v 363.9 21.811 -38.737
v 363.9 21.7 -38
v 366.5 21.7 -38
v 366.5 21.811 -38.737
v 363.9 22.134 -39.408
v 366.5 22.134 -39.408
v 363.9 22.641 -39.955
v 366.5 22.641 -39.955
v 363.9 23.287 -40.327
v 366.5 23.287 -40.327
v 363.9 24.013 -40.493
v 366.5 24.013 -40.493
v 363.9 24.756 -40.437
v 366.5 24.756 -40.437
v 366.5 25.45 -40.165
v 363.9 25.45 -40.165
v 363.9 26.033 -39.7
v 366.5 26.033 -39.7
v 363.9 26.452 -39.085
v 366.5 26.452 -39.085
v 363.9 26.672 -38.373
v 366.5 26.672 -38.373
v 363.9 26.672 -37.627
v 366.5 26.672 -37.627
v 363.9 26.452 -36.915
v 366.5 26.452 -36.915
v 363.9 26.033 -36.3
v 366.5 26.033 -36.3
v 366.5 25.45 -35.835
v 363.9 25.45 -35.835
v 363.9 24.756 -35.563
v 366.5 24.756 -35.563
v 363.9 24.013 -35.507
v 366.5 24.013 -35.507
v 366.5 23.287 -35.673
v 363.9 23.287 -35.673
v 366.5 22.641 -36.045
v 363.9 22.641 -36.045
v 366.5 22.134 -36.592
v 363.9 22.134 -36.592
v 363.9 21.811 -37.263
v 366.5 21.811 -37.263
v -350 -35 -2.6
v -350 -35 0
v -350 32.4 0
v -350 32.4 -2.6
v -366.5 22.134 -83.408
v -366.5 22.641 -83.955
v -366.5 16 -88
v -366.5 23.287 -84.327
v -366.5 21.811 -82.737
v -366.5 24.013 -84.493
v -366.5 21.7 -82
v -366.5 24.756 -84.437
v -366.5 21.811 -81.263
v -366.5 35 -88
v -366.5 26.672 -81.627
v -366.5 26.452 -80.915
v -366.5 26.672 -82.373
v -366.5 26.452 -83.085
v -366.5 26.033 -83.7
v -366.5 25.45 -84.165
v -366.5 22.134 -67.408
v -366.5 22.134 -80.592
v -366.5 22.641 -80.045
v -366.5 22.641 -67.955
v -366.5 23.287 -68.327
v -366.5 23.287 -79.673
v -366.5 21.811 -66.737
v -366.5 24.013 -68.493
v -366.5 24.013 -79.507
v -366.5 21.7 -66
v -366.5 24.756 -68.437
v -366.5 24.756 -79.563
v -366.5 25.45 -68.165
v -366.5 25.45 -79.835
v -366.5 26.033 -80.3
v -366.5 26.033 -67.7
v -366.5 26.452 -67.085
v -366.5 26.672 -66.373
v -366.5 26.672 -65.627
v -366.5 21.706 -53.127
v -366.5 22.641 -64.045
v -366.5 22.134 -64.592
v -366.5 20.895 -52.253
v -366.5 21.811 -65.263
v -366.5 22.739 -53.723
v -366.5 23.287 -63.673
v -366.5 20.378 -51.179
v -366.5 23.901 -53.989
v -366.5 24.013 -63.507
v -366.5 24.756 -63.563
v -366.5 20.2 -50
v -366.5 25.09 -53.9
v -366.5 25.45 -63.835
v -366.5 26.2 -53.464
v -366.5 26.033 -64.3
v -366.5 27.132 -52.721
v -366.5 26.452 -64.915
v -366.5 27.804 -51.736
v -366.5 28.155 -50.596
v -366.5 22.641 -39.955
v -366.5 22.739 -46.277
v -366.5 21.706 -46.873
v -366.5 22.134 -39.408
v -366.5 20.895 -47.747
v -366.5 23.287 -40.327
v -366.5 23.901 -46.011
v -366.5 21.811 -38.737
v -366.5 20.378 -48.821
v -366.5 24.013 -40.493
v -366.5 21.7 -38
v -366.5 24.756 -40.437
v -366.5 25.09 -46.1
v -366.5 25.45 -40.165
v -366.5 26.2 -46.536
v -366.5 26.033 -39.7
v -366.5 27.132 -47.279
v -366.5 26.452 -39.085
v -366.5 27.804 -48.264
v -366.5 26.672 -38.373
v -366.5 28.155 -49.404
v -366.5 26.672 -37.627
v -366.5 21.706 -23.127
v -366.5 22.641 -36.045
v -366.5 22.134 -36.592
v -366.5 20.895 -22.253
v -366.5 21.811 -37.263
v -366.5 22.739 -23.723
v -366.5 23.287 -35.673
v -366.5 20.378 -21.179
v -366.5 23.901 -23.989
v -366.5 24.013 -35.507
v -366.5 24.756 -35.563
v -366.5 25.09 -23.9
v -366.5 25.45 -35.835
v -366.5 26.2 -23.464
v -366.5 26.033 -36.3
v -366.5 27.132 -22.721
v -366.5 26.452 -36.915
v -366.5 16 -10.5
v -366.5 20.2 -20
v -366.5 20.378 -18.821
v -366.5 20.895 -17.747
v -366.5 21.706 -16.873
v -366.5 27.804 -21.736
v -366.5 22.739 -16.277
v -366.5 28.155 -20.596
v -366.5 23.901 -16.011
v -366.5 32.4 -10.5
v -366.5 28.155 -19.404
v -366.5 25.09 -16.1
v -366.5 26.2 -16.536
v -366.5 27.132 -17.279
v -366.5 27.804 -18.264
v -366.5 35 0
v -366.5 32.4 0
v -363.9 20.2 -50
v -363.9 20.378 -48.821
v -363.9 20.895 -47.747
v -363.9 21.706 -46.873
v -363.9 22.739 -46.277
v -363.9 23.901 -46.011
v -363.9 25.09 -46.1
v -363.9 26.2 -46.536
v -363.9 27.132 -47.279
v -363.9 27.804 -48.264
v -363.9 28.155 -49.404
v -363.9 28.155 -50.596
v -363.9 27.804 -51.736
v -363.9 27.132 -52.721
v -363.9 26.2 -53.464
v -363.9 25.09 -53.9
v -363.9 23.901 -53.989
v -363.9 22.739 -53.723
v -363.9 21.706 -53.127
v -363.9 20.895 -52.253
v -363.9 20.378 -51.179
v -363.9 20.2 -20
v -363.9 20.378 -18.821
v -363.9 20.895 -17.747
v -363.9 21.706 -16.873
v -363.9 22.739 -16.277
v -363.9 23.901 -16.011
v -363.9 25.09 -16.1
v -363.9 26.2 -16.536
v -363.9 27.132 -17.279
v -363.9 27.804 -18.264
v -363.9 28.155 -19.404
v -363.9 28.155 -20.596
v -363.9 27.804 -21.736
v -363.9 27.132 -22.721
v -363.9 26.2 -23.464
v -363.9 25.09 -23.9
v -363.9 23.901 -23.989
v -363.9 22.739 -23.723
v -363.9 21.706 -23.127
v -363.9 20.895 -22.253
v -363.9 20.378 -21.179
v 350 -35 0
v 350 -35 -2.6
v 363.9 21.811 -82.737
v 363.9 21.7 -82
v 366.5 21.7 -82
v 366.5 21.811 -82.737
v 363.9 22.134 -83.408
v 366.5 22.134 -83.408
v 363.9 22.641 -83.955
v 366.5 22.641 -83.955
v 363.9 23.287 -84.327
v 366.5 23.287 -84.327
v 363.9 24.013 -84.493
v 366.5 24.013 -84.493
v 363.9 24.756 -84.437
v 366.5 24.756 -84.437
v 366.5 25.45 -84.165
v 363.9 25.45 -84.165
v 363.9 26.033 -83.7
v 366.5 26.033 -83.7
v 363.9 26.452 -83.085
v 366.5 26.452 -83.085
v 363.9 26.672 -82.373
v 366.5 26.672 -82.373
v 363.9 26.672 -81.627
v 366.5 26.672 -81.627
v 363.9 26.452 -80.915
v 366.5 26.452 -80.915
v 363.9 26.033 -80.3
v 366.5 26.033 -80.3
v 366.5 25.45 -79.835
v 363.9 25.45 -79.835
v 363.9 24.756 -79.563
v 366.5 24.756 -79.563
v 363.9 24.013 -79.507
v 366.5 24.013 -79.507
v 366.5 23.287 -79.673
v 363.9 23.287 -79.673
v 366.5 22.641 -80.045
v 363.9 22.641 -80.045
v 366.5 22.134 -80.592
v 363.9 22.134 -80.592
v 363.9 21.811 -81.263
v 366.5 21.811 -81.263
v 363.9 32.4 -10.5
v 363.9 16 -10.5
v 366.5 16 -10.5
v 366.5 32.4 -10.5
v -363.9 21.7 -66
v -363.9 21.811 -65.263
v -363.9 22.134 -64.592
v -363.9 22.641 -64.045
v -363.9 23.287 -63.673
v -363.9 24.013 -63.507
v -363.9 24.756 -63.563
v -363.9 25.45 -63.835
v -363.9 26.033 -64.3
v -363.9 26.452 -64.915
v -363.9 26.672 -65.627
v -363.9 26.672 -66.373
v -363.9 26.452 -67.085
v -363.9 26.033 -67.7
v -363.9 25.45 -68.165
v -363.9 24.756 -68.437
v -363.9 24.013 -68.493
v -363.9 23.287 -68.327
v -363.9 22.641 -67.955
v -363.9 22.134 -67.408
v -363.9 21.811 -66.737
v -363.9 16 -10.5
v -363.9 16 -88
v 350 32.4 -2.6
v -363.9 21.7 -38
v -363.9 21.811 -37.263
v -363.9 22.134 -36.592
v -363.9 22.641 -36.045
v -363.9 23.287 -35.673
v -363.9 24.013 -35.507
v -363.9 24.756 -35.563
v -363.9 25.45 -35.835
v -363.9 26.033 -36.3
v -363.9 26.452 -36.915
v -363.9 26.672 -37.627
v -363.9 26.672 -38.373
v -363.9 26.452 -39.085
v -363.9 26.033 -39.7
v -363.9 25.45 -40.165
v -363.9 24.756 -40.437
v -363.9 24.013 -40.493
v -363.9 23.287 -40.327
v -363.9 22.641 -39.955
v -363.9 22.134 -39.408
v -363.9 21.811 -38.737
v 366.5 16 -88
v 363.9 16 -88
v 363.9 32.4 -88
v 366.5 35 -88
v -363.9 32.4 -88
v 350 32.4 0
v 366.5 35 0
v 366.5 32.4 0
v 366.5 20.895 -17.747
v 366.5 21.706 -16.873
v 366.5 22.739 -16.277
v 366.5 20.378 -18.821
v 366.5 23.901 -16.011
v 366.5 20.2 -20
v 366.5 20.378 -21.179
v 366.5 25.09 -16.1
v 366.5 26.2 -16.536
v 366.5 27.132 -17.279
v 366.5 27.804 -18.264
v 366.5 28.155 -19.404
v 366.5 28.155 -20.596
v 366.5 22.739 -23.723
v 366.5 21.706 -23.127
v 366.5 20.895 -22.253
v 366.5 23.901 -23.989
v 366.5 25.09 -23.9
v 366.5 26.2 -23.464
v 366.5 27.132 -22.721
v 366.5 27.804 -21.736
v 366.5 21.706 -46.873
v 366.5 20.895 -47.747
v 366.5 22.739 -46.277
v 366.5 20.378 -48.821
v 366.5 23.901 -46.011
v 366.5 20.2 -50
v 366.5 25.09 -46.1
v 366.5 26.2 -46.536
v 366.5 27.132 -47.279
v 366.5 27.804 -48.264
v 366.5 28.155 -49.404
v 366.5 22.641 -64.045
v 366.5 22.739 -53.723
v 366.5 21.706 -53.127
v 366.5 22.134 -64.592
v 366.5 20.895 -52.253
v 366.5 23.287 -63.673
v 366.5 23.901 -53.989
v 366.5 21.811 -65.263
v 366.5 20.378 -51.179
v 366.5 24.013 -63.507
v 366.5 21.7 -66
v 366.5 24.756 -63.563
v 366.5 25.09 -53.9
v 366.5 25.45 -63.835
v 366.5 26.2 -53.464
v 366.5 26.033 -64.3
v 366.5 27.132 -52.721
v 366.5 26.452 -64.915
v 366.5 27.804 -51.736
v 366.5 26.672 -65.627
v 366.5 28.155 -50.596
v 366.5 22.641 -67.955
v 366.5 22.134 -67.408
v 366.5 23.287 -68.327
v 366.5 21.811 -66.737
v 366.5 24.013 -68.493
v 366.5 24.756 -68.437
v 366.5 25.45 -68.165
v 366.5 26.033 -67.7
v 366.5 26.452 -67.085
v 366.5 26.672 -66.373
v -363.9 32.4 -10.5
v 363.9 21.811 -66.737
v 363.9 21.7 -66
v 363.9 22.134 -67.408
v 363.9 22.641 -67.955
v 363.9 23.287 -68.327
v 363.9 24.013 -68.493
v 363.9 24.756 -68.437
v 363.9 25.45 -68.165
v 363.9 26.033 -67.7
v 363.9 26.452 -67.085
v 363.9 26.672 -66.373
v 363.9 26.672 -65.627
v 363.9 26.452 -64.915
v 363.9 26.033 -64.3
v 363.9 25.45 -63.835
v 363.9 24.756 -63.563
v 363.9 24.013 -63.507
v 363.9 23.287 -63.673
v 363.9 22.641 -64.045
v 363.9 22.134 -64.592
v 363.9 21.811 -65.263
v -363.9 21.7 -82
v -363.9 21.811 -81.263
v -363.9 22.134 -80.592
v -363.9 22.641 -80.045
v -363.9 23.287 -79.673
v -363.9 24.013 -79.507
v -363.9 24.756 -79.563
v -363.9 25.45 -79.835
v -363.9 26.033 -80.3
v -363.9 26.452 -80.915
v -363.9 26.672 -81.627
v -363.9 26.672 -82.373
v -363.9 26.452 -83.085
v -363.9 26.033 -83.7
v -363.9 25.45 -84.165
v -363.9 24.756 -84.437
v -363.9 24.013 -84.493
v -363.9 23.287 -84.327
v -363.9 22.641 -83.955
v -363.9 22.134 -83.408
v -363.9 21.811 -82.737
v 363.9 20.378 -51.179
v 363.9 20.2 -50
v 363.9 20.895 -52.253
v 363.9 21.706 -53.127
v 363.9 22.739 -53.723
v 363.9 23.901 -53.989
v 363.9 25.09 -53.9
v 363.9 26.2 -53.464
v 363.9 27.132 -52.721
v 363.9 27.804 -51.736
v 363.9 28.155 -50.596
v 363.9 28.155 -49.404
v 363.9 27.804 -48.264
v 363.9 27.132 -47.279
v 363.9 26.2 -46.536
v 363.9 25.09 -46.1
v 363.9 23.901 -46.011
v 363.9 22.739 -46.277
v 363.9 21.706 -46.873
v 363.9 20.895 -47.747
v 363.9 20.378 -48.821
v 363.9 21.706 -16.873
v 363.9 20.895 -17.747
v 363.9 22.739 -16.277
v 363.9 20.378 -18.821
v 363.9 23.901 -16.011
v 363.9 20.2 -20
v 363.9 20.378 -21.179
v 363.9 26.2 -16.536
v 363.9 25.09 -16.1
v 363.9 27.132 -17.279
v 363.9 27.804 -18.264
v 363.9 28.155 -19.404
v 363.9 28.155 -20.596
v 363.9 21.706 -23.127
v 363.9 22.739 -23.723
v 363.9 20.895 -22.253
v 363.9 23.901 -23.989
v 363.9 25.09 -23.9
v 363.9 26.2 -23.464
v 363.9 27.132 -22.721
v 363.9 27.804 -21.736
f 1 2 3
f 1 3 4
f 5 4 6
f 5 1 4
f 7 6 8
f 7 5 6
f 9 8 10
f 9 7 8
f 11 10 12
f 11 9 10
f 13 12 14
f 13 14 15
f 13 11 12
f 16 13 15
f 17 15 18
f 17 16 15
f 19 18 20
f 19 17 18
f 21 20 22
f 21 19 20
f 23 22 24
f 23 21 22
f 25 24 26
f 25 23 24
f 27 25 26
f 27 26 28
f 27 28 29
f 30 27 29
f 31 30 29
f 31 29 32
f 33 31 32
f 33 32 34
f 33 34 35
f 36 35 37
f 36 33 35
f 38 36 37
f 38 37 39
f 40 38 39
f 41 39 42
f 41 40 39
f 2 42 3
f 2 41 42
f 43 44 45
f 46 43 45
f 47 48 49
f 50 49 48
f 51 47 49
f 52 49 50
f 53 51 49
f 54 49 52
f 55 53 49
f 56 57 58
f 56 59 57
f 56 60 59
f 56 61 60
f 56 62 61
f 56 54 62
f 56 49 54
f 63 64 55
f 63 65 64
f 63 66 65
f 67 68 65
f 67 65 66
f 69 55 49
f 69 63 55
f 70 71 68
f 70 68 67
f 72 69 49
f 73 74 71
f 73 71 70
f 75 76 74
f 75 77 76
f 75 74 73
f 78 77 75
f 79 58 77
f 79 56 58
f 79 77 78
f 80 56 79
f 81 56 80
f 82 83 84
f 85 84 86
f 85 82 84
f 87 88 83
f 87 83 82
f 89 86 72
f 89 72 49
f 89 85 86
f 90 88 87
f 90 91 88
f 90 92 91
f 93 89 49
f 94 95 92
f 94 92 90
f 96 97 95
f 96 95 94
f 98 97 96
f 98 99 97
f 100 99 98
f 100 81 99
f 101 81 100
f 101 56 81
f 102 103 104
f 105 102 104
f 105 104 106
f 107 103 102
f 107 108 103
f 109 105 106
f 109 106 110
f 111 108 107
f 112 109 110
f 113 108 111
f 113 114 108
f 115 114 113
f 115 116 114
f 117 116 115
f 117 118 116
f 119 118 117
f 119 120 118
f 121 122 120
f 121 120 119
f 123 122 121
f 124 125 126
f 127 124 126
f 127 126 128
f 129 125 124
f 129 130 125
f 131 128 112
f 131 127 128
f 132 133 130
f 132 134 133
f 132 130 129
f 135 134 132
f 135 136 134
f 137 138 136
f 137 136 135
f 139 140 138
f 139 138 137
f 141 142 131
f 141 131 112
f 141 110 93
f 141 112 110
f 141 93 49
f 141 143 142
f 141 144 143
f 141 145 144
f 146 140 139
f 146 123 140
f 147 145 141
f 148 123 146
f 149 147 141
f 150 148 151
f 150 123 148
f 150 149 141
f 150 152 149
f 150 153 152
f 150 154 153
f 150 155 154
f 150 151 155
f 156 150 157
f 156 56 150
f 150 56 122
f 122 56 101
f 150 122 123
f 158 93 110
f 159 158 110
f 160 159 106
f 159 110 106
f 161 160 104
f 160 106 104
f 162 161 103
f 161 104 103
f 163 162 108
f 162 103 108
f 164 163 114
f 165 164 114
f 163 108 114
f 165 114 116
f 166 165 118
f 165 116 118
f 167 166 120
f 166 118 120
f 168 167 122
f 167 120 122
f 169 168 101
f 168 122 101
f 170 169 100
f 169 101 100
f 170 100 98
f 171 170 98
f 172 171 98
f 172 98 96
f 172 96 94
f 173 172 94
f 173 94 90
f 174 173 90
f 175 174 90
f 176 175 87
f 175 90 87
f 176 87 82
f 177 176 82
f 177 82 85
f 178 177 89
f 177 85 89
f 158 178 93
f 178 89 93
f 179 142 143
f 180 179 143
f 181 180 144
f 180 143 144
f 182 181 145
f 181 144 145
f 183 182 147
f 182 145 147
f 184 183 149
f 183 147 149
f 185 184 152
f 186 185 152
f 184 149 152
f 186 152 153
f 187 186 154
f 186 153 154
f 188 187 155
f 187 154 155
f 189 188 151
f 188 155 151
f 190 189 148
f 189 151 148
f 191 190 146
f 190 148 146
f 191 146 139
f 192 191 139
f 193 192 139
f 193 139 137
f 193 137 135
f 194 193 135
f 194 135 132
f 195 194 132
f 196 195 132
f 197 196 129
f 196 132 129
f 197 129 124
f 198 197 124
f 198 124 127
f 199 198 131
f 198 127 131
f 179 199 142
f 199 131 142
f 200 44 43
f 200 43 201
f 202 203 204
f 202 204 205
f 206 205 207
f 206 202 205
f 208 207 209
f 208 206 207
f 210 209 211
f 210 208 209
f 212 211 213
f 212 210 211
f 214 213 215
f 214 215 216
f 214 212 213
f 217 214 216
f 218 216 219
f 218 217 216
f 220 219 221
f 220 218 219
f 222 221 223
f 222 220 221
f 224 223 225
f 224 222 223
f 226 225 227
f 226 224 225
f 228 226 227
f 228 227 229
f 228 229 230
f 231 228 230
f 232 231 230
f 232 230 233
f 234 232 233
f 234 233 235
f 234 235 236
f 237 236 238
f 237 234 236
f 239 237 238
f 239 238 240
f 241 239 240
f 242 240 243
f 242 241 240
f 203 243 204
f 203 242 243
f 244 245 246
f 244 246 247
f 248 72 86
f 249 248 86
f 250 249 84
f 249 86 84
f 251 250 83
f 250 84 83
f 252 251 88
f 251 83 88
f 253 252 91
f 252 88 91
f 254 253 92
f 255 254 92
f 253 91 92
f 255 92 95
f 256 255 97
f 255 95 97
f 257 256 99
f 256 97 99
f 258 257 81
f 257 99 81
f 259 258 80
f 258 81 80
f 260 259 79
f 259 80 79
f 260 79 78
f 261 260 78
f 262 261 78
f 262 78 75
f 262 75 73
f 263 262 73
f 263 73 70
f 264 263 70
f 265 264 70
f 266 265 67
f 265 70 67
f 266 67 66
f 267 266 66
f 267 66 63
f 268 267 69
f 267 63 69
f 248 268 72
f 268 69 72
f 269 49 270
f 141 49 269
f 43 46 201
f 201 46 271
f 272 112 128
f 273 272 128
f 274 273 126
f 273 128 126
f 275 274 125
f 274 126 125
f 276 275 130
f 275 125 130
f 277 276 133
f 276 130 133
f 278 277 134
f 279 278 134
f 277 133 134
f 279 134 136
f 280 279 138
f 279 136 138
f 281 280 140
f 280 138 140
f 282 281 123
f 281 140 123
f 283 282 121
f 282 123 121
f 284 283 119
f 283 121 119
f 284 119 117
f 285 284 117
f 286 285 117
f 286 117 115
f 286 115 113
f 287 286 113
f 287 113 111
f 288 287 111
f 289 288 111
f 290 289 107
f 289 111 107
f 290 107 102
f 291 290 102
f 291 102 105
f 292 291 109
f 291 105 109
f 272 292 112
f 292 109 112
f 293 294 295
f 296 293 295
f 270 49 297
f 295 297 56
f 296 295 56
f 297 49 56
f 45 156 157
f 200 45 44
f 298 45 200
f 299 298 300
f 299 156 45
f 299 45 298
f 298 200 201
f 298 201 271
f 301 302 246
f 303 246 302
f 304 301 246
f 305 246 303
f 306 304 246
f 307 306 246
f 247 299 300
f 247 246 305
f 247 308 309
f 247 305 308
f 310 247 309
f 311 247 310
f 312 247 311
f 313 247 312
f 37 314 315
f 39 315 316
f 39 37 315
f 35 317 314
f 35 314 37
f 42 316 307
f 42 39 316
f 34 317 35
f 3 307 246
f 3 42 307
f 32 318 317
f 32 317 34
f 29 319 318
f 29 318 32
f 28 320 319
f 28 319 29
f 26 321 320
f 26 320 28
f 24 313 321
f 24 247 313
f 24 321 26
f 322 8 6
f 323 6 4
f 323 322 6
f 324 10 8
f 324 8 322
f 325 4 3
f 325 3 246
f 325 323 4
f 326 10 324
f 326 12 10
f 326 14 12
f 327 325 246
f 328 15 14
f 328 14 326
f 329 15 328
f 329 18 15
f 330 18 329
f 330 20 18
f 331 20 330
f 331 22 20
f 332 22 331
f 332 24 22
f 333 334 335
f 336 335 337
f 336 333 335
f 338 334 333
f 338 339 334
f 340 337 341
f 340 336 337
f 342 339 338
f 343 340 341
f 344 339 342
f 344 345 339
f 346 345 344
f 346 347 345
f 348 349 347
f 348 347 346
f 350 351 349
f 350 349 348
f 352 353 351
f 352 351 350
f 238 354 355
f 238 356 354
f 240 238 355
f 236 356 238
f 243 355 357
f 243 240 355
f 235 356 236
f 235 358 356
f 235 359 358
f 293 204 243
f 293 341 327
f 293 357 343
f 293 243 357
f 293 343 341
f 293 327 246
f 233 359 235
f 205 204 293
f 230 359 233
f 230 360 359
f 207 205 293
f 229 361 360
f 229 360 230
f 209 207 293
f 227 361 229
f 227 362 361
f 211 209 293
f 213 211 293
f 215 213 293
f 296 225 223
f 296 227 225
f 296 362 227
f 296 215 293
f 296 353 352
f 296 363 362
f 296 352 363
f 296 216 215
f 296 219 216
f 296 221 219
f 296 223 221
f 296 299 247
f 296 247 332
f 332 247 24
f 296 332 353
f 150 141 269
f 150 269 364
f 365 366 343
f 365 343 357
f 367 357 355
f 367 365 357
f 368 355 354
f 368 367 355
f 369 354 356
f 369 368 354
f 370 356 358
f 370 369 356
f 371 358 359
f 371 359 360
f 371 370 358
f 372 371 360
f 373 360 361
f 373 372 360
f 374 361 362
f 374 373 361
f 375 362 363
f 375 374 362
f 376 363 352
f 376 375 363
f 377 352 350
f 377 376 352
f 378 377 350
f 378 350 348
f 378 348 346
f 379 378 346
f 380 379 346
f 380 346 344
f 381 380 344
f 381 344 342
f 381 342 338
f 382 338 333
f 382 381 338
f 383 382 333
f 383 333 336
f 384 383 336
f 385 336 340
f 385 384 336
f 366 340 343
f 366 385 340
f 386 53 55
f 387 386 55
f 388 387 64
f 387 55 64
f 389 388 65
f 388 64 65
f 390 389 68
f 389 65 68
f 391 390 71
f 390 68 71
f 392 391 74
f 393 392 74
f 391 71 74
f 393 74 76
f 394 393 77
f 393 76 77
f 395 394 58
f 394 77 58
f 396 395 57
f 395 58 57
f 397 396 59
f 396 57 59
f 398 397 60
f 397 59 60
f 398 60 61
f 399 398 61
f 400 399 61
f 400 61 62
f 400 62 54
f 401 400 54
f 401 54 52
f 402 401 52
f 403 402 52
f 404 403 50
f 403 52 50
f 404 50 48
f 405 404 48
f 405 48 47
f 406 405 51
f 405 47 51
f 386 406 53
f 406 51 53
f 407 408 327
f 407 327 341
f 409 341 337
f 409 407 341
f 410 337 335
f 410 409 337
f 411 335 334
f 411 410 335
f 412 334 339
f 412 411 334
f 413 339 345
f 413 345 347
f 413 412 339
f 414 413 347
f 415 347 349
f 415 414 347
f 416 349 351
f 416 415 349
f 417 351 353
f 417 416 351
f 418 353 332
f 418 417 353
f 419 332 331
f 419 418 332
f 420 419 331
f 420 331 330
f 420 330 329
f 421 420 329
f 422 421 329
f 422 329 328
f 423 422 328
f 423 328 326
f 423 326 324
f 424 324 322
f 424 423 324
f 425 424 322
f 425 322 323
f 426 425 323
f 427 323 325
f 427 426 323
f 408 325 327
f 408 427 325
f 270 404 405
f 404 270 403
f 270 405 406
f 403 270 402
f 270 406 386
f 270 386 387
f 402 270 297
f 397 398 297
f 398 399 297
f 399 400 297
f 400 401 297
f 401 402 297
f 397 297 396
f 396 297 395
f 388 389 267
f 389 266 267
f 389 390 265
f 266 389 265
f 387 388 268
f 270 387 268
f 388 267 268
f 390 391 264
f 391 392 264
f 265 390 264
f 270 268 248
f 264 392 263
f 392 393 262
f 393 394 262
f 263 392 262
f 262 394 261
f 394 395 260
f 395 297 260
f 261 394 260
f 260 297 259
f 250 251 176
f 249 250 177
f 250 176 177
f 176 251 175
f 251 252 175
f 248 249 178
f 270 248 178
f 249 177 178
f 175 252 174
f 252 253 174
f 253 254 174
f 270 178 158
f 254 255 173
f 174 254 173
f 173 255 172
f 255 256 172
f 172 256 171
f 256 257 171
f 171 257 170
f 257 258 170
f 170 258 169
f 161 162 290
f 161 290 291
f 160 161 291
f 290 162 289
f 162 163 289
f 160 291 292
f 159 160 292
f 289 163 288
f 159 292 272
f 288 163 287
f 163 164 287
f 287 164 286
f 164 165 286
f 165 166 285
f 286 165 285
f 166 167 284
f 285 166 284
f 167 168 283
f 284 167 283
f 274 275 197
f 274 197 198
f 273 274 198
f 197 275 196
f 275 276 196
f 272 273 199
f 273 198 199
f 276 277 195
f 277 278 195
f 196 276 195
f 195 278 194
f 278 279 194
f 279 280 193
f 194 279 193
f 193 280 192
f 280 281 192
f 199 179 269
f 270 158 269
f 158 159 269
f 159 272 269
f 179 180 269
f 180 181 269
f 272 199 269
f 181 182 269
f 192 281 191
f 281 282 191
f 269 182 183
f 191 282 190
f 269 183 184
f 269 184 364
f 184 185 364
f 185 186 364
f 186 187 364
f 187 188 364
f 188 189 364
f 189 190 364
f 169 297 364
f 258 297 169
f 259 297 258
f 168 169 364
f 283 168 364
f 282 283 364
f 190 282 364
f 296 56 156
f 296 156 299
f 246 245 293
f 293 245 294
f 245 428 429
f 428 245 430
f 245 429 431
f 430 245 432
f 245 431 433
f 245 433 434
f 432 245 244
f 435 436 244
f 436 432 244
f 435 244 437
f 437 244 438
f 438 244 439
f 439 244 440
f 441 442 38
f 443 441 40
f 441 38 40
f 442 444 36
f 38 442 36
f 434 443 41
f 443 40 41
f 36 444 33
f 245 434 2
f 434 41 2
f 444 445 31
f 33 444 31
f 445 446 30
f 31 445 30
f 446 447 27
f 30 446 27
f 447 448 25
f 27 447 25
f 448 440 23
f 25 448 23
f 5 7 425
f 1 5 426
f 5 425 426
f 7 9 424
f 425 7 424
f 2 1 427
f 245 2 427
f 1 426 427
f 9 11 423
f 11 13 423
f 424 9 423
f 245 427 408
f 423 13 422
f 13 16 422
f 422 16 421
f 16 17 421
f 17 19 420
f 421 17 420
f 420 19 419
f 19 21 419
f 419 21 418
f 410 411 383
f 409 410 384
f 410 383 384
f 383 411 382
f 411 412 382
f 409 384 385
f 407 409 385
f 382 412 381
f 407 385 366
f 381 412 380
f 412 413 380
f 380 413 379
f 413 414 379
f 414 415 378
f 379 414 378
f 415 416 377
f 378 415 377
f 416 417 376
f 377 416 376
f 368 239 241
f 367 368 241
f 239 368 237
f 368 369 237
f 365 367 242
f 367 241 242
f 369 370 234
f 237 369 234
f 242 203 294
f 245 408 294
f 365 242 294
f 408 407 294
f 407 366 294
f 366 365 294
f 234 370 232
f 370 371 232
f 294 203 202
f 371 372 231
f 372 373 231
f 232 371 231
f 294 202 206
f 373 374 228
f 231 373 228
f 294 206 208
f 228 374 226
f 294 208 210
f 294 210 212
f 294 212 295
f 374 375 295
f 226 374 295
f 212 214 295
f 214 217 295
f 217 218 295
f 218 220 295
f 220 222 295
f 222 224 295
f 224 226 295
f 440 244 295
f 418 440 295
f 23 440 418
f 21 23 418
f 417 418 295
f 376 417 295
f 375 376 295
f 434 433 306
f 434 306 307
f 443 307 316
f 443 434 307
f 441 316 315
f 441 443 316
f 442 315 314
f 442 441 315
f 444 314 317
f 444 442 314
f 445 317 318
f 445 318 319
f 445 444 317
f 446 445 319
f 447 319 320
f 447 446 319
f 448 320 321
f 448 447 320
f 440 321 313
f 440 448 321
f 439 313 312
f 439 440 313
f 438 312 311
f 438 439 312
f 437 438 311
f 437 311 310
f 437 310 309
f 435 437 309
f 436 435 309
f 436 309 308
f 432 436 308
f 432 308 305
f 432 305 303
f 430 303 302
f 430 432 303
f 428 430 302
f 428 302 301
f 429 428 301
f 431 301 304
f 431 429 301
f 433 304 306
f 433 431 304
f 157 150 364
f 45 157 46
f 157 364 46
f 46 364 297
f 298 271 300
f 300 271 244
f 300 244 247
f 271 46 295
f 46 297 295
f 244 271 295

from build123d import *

# Parameters (mm, degrees)
SKETCH1_W           = 700
SKETCH1_H           = 70
BOSS_EXTRUDE1_DEPTH = 2.6
SKETCH2_W           = 733
SKETCH2_H           = 88
BOSS_EXTRUDE2_DEPTH = 2.6
SKETCH3_W           = 77.5
SKETCH3_H           = 16.4
SKETCH3_R           = 2.5
SKETCH3_R_2         = 4
BOSS_EXTRUDE3_DEPTH = 2.6
BOSS_EXTRUDE4_START = -2.6
SKETCH4_W           = 77.5
SKETCH4_H           = 16.4
SKETCH4_R           = 2.5
SKETCH4_R_2         = 4
BOSS_EXTRUDE4_DEPTH = 2.6


with BuildPart() as part:
    # Sketch1 → Boss-Extrude1 (new body)
    with BuildSketch(Plane.XY):
        Rectangle(SKETCH1_W, SKETCH1_H)
    extrude(amount=-BOSS_EXTRUDE1_DEPTH)

    # Sketch2 → Boss-Extrude2 (add)
    with BuildSketch(Plane(origin=(0, 35, 0), x_dir=(1, 0, 0), z_dir=(0, 1, 0))):
        with Locations((0, 44)):
            Rectangle(SKETCH2_W, SKETCH2_H)
    extrude(amount=-BOSS_EXTRUDE2_DEPTH)

    # Sketch3 → Boss-Extrude3 (add)
    with BuildSketch(Plane.ZY.offset(366.5)):
        with Locations((-49.25, 24.2)):
            Rectangle(SKETCH3_W, SKETCH3_H)
        with Locations(Location((-82, 24.2, 0), (0, 0, 270))):
            Circle(SKETCH3_R, mode=Mode.SUBTRACT)
        with Locations(Location((-66, 24.2, 0), (0, 0, 270))):
            Circle(SKETCH3_R, mode=Mode.SUBTRACT)
        with Locations(Location((-50, 24.2, 0), (0, 0, 270))):
            Circle(SKETCH3_R_2, mode=Mode.SUBTRACT)
        with Locations(Location((-38, 24.2, 0), (0, 0, 270))):
            Circle(SKETCH3_R, mode=Mode.SUBTRACT)
        with Locations(Location((-20, 24.2, 0), (0, 0, 270))):
            Circle(SKETCH3_R_2, mode=Mode.SUBTRACT)
    extrude(amount=-BOSS_EXTRUDE3_DEPTH)

    # Sketch4 → Boss-Extrude4 (add)
    with BuildSketch(Plane(origin=(366.5, 0, 0), x_dir=(0, 0, -1), z_dir=(1, 0, 0)).offset(BOSS_EXTRUDE4_START)):
        with Locations((49.25, 24.2)):
            Rectangle(SKETCH4_W, SKETCH4_H)
        with Locations(Location((38, 24.2, 0), (0, 0, 270))):
            Circle(SKETCH4_R, mode=Mode.SUBTRACT)
        with Locations(Location((50, 24.2, 0), (0, 0, 270))):
            Circle(SKETCH4_R_2, mode=Mode.SUBTRACT)
        with Locations(Location((66, 24.2, 0), (0, 0, 270))):
            Circle(SKETCH4_R, mode=Mode.SUBTRACT)
        with Locations(Location((82, 24.2, 0), (0, 0, 270))):
            Circle(SKETCH4_R, mode=Mode.SUBTRACT)
        with Locations(Location((20, 24.2, 0), (0, 0, 270))):
            Circle(SKETCH4_R_2, mode=Mode.SUBTRACT)
    extrude(amount=BOSS_EXTRUDE4_DEPTH)


solid = part.part
